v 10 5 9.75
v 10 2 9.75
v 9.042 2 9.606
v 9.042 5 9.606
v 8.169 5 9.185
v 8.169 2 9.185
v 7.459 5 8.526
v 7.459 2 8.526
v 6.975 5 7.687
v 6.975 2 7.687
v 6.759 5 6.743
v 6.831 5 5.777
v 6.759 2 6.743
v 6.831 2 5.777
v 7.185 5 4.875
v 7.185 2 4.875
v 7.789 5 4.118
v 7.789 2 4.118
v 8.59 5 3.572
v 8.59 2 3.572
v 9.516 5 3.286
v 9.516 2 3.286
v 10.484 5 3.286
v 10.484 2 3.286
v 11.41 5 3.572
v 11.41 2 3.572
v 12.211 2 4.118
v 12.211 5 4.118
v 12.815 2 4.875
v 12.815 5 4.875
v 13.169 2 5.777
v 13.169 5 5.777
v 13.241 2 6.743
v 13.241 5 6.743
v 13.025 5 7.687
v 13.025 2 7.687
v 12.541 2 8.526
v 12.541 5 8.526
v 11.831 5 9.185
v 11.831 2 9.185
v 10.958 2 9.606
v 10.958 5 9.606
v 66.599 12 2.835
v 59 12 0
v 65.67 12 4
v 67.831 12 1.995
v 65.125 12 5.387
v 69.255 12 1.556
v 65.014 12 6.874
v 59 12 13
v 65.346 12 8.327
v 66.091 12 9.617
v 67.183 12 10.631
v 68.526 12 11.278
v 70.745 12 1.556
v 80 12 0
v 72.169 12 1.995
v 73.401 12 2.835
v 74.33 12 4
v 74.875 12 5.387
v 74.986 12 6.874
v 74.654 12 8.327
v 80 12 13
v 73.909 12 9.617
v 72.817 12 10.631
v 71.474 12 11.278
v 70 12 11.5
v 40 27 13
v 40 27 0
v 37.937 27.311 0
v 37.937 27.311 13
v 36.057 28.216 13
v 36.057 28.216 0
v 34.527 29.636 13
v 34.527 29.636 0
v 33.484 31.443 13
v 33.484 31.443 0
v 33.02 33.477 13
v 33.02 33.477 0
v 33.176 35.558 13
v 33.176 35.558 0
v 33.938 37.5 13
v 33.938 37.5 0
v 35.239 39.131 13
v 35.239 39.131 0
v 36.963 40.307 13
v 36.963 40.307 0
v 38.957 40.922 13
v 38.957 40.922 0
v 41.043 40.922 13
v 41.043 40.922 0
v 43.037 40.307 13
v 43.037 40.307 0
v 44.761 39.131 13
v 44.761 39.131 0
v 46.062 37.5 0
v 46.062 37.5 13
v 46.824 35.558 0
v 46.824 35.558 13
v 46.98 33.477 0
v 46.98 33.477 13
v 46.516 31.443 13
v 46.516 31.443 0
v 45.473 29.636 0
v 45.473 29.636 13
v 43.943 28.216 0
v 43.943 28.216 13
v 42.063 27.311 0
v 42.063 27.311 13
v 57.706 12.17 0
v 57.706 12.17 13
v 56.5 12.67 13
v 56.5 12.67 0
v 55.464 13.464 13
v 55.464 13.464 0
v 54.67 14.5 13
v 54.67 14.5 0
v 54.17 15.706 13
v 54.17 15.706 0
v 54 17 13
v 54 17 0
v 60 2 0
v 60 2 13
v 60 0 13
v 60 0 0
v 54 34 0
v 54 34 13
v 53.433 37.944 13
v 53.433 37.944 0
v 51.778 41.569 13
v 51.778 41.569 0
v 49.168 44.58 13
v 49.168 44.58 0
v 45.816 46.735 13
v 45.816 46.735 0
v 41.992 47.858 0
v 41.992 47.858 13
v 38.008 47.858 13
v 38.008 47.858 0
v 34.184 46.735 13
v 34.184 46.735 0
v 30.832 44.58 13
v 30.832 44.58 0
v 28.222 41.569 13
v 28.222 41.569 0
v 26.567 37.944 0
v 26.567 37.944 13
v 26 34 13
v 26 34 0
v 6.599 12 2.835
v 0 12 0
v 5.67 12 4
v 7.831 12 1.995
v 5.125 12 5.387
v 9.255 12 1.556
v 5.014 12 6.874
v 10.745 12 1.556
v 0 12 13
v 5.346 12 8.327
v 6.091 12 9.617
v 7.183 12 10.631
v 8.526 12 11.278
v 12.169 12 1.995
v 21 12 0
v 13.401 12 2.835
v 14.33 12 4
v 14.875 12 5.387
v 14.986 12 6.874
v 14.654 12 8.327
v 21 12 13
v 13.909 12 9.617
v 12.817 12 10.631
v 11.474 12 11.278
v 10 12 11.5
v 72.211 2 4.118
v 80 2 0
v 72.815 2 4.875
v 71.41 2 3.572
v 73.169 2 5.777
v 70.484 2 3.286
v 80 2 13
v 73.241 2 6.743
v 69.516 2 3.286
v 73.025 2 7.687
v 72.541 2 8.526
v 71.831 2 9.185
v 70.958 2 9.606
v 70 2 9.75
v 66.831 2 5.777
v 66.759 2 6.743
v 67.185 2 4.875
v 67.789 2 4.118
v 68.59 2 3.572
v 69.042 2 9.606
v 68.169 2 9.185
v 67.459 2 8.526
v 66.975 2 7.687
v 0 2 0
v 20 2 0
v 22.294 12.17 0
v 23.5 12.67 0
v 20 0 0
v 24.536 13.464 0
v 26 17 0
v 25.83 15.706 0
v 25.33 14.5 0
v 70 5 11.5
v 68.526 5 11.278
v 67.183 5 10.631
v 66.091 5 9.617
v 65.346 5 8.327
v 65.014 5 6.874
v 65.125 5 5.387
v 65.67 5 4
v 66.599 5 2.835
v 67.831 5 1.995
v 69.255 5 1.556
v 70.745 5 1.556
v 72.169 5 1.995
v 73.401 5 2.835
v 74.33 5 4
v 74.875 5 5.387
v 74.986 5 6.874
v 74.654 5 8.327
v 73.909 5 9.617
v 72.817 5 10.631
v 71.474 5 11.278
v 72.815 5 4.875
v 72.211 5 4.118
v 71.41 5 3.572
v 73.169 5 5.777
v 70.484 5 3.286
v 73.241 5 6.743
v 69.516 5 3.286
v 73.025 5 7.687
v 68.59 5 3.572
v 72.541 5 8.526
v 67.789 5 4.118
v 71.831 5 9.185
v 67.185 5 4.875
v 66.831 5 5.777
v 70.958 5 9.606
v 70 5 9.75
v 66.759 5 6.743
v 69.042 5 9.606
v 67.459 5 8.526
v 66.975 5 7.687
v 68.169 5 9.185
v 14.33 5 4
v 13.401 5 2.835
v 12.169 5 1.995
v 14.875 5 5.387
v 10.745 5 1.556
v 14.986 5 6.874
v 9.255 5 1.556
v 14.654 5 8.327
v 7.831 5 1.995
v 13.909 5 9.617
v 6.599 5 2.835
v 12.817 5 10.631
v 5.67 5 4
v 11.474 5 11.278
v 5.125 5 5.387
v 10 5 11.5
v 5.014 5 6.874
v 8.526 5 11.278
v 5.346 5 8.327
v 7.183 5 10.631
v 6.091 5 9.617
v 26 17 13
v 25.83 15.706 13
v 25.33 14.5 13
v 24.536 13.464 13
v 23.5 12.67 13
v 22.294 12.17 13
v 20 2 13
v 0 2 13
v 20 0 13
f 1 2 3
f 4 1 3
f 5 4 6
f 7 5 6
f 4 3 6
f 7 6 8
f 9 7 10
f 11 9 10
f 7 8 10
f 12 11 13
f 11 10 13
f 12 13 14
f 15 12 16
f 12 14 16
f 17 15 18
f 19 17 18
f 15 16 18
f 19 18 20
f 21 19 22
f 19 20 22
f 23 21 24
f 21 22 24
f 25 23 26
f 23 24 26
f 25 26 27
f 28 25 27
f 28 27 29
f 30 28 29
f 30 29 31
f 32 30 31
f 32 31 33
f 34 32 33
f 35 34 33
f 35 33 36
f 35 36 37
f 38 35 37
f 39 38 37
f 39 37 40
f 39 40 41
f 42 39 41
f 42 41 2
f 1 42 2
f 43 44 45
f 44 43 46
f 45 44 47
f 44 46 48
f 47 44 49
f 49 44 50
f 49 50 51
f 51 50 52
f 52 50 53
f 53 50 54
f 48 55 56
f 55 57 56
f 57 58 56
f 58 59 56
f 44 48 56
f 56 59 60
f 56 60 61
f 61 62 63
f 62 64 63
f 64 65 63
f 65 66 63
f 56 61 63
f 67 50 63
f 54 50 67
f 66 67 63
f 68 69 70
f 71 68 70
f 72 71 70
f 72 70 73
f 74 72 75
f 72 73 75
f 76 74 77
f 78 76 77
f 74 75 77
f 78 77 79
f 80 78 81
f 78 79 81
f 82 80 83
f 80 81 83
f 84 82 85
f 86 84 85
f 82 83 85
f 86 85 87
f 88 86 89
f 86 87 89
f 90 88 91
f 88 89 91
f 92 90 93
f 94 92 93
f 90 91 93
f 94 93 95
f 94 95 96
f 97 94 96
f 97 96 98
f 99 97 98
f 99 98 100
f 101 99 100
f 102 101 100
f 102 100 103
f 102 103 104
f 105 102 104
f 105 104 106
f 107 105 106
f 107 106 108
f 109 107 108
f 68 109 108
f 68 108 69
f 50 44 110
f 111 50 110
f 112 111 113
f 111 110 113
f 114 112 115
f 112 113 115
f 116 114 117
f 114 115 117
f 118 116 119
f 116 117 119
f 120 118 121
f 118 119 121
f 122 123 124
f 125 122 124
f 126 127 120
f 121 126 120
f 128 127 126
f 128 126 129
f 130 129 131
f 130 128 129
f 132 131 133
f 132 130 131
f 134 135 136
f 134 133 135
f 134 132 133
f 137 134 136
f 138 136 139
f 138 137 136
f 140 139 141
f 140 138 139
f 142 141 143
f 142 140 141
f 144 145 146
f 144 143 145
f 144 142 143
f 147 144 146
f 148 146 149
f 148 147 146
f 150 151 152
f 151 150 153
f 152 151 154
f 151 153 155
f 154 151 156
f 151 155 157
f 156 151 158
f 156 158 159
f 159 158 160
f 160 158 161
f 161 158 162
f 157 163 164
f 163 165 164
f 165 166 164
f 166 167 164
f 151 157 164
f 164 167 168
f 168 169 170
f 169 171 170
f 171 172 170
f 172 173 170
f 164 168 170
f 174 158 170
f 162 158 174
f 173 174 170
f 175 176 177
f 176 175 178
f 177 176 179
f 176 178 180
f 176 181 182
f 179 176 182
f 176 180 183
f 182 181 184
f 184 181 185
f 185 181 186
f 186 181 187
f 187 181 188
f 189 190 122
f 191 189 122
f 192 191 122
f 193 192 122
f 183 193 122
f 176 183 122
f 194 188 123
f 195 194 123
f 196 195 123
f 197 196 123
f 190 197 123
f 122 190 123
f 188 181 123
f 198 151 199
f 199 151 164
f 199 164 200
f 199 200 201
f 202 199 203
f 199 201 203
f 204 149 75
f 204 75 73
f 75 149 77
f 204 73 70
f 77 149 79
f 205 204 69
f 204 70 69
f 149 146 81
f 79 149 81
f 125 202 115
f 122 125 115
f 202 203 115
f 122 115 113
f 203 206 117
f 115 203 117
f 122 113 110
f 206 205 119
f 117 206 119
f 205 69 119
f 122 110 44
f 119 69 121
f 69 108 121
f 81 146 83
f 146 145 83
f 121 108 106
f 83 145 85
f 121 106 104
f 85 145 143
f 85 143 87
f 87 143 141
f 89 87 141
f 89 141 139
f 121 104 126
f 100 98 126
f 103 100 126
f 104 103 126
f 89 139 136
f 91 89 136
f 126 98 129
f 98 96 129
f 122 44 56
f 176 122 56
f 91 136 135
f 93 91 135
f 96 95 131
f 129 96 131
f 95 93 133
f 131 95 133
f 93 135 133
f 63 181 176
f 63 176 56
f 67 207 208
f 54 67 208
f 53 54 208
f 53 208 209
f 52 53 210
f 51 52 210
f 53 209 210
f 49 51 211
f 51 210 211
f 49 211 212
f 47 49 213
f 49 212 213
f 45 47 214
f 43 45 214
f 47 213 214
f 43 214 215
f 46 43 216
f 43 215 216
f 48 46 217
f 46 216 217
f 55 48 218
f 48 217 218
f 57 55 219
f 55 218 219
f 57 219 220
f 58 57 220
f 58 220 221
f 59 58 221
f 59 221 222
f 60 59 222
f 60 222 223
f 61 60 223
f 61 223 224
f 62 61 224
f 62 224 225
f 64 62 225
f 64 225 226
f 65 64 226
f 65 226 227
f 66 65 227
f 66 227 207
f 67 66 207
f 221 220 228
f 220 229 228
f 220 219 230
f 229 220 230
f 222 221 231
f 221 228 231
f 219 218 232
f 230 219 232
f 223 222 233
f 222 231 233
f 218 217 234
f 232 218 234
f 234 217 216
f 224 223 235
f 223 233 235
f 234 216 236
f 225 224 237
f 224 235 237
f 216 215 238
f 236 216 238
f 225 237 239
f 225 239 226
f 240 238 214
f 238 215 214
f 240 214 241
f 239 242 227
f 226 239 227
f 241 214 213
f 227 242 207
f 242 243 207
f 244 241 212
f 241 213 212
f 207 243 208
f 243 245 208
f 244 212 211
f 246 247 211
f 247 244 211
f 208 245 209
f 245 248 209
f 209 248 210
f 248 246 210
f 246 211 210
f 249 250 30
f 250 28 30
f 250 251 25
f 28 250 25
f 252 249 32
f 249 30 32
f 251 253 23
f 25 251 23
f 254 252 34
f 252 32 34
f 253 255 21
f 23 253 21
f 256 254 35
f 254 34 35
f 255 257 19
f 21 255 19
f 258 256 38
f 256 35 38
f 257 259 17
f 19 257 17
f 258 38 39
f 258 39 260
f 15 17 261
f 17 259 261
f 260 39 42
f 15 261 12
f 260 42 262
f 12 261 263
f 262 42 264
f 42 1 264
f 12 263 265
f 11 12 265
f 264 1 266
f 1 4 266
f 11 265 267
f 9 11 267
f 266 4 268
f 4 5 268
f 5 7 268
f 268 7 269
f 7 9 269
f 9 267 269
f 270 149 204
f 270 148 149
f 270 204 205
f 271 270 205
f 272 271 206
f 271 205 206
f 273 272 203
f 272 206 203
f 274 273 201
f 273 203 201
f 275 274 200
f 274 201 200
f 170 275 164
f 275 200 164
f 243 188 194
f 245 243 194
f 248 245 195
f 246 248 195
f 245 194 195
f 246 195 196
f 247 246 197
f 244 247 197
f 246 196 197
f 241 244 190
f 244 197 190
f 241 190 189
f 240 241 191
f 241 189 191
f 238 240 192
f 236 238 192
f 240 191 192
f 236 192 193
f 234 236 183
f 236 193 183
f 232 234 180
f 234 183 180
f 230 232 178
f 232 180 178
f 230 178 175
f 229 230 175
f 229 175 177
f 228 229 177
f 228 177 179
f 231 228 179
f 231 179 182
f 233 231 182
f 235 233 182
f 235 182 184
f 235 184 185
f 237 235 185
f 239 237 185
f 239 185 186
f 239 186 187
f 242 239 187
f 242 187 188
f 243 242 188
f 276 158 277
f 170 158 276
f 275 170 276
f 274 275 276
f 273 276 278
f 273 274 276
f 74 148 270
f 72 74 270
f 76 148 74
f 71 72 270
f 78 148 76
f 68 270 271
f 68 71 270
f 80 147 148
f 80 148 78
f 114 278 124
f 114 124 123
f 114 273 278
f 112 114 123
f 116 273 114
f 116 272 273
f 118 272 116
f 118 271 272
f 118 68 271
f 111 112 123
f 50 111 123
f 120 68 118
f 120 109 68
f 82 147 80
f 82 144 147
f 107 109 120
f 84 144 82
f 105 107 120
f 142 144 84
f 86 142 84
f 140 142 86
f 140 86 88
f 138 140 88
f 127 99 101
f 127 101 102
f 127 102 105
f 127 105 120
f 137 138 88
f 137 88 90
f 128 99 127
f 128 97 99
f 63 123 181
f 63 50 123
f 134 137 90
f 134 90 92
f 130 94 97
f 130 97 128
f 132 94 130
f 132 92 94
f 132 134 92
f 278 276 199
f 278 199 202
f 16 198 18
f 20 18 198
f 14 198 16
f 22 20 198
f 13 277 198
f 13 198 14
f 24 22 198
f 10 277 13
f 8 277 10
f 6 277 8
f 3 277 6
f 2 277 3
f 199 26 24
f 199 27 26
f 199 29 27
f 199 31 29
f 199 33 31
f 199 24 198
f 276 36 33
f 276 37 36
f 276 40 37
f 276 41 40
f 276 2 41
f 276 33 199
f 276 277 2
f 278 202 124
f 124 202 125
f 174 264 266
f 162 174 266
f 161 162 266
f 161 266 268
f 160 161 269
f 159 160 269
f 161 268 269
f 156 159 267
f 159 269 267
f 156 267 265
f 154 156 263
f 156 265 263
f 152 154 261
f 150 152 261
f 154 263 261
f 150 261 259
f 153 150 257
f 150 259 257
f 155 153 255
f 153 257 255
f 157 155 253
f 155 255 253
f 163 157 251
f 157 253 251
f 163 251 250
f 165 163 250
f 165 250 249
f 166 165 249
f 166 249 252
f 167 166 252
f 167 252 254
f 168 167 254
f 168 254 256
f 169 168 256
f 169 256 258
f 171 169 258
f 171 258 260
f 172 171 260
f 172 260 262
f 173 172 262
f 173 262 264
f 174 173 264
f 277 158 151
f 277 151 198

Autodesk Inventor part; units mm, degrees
ref_plane "YZ Plane" through (0, 0, 0) normal (1, 0, 0) x (0, 1, 0)
ref_plane "XZ Plane" through (0, 0, 0) normal (0, 1, 0) x (-1, 0, 0)
ref_plane "XY Plane" through (0, 0, 0) normal (0, 0, 1) x (1, 0, 0)
sketch "Sketch1" plane through (0, 0, 0) normal (0, 0, 1) x (1, 0, 0)
  line L0 (0, 0) -> (80, 0)
  line L1 (80, 0) -> (80, 48)
  line L2 (80, 48) -> (0, 48)
  line L3 (0, 48) -> (0, 0)
  dimension "d0" = 80
  dimension "d1" = 48
extrude "Extrusion1" add sketch "Sketch1" along normal blind 13
sketch "Sketch2" plane through (0, 0, 13) normal (0, 0, 1) x (1, 0, 0)
  line L0 (80, 0) -> (0, 0) projected
  line L1 (80, 48) -> (80, 0) projected
  point P0 (40, 34)
  dimension "d4" = 34
  dimension "d5" = 40
hole "Hole1" at (40, 34, 13) direction (0, 0, -1) diameter 14 depth 13 tip angle 118
sketch "Sketch3" plane through (0, 0, 13) normal (0, 0, 1) x (1, 0, 0)
  circle A0 centre (40, 34) radius 7 projected
  line L0 (0, 0) -> (0, 48) projected
  line L1 (80, 0) -> (0, 0) projected
  line L2 (80, 48) -> (80, 0) projected
  line L3 (0, 48) -> (80, 48) projected
  arc A1 (54, 34) -> (26, 34) centre (40, 34) ccw
  line L4 (54, 34) -> (54, 12)
  line L5 (26, 34) -> (26, 12)
  line L6 (0, 12) -> (26, 12)
  line L7 (54, 12) -> (80, 12)
  dimension "d14" = 12
  dimension "d15" = 12
  dimension "d16" = 26
extrude "Extrusion2" cut sketch "Sketch3" against normal blind 13 contours L0 L3 A1 L5 L6 | L7 L4 A1 L3 L2
sketch "Sketch4" plane through (0, 0, 13) normal (0, 0, 1) x (1, 0, 0)
  line L0 (0, 0) -> (0, 12) projected
  line L1 (80, 0) -> (0, 0) projected
  line L2 (80, 12) -> (80, 0) projected
  line L3 (0, 2) -> (20, 2)
  line L4 (20, 2) -> (20, 0)
  line L5 (20, 0) -> (0, 0)
  line L6 (0, 0) -> (0, 2)
  line L7 (60, 0) -> (80, 0)
  line L8 (80, 0) -> (80, 2)
  line L9 (80, 2) -> (60, 2)
  line L10 (60, 2) -> (60, 0)
  dimension "d19" = 2
  dimension "d20" = 2
  dimension "d21" = 20
  dimension "d22" = 20
extrude "Extrusion3" cut sketch "Sketch4" against normal blind 13
sketch "Sketch5" plane through (0, 12, 13) normal (0, 1, 0) x (1, 0, 0)
  line L0 (0, 0) -> (0, 13) projected
  line L1 (26, 0) -> (0, 0) projected
  line L2 (54, 13) -> (80, 13) projected
  line L3 (54, 0) -> (54, 13) projected
  line L4 (80, 0) -> (54, 0) projected
  line L5 (80, 13) -> (80, 0) projected
  point P0 (10, 6.5)
  point P1 (70, 6.5)
  dimension "d25" = 60
  dimension "d26" = 10
  dimension "d27" = 6.5
hole "Hole2" at (10, 12, 6.5) at (70, 12, 6.5) direction (0, -1, 0) diameter 6.5 depth 10 tip angle 118 counterbore diameter 10 counterbore depth 7
fillet "Fillet1" radius 5 2 edges at (54, 12, 6.5) (26, 12, 6.5)
properties part number "MANCAL DA BETONEIRA(26)" material "Carbon Steel"
